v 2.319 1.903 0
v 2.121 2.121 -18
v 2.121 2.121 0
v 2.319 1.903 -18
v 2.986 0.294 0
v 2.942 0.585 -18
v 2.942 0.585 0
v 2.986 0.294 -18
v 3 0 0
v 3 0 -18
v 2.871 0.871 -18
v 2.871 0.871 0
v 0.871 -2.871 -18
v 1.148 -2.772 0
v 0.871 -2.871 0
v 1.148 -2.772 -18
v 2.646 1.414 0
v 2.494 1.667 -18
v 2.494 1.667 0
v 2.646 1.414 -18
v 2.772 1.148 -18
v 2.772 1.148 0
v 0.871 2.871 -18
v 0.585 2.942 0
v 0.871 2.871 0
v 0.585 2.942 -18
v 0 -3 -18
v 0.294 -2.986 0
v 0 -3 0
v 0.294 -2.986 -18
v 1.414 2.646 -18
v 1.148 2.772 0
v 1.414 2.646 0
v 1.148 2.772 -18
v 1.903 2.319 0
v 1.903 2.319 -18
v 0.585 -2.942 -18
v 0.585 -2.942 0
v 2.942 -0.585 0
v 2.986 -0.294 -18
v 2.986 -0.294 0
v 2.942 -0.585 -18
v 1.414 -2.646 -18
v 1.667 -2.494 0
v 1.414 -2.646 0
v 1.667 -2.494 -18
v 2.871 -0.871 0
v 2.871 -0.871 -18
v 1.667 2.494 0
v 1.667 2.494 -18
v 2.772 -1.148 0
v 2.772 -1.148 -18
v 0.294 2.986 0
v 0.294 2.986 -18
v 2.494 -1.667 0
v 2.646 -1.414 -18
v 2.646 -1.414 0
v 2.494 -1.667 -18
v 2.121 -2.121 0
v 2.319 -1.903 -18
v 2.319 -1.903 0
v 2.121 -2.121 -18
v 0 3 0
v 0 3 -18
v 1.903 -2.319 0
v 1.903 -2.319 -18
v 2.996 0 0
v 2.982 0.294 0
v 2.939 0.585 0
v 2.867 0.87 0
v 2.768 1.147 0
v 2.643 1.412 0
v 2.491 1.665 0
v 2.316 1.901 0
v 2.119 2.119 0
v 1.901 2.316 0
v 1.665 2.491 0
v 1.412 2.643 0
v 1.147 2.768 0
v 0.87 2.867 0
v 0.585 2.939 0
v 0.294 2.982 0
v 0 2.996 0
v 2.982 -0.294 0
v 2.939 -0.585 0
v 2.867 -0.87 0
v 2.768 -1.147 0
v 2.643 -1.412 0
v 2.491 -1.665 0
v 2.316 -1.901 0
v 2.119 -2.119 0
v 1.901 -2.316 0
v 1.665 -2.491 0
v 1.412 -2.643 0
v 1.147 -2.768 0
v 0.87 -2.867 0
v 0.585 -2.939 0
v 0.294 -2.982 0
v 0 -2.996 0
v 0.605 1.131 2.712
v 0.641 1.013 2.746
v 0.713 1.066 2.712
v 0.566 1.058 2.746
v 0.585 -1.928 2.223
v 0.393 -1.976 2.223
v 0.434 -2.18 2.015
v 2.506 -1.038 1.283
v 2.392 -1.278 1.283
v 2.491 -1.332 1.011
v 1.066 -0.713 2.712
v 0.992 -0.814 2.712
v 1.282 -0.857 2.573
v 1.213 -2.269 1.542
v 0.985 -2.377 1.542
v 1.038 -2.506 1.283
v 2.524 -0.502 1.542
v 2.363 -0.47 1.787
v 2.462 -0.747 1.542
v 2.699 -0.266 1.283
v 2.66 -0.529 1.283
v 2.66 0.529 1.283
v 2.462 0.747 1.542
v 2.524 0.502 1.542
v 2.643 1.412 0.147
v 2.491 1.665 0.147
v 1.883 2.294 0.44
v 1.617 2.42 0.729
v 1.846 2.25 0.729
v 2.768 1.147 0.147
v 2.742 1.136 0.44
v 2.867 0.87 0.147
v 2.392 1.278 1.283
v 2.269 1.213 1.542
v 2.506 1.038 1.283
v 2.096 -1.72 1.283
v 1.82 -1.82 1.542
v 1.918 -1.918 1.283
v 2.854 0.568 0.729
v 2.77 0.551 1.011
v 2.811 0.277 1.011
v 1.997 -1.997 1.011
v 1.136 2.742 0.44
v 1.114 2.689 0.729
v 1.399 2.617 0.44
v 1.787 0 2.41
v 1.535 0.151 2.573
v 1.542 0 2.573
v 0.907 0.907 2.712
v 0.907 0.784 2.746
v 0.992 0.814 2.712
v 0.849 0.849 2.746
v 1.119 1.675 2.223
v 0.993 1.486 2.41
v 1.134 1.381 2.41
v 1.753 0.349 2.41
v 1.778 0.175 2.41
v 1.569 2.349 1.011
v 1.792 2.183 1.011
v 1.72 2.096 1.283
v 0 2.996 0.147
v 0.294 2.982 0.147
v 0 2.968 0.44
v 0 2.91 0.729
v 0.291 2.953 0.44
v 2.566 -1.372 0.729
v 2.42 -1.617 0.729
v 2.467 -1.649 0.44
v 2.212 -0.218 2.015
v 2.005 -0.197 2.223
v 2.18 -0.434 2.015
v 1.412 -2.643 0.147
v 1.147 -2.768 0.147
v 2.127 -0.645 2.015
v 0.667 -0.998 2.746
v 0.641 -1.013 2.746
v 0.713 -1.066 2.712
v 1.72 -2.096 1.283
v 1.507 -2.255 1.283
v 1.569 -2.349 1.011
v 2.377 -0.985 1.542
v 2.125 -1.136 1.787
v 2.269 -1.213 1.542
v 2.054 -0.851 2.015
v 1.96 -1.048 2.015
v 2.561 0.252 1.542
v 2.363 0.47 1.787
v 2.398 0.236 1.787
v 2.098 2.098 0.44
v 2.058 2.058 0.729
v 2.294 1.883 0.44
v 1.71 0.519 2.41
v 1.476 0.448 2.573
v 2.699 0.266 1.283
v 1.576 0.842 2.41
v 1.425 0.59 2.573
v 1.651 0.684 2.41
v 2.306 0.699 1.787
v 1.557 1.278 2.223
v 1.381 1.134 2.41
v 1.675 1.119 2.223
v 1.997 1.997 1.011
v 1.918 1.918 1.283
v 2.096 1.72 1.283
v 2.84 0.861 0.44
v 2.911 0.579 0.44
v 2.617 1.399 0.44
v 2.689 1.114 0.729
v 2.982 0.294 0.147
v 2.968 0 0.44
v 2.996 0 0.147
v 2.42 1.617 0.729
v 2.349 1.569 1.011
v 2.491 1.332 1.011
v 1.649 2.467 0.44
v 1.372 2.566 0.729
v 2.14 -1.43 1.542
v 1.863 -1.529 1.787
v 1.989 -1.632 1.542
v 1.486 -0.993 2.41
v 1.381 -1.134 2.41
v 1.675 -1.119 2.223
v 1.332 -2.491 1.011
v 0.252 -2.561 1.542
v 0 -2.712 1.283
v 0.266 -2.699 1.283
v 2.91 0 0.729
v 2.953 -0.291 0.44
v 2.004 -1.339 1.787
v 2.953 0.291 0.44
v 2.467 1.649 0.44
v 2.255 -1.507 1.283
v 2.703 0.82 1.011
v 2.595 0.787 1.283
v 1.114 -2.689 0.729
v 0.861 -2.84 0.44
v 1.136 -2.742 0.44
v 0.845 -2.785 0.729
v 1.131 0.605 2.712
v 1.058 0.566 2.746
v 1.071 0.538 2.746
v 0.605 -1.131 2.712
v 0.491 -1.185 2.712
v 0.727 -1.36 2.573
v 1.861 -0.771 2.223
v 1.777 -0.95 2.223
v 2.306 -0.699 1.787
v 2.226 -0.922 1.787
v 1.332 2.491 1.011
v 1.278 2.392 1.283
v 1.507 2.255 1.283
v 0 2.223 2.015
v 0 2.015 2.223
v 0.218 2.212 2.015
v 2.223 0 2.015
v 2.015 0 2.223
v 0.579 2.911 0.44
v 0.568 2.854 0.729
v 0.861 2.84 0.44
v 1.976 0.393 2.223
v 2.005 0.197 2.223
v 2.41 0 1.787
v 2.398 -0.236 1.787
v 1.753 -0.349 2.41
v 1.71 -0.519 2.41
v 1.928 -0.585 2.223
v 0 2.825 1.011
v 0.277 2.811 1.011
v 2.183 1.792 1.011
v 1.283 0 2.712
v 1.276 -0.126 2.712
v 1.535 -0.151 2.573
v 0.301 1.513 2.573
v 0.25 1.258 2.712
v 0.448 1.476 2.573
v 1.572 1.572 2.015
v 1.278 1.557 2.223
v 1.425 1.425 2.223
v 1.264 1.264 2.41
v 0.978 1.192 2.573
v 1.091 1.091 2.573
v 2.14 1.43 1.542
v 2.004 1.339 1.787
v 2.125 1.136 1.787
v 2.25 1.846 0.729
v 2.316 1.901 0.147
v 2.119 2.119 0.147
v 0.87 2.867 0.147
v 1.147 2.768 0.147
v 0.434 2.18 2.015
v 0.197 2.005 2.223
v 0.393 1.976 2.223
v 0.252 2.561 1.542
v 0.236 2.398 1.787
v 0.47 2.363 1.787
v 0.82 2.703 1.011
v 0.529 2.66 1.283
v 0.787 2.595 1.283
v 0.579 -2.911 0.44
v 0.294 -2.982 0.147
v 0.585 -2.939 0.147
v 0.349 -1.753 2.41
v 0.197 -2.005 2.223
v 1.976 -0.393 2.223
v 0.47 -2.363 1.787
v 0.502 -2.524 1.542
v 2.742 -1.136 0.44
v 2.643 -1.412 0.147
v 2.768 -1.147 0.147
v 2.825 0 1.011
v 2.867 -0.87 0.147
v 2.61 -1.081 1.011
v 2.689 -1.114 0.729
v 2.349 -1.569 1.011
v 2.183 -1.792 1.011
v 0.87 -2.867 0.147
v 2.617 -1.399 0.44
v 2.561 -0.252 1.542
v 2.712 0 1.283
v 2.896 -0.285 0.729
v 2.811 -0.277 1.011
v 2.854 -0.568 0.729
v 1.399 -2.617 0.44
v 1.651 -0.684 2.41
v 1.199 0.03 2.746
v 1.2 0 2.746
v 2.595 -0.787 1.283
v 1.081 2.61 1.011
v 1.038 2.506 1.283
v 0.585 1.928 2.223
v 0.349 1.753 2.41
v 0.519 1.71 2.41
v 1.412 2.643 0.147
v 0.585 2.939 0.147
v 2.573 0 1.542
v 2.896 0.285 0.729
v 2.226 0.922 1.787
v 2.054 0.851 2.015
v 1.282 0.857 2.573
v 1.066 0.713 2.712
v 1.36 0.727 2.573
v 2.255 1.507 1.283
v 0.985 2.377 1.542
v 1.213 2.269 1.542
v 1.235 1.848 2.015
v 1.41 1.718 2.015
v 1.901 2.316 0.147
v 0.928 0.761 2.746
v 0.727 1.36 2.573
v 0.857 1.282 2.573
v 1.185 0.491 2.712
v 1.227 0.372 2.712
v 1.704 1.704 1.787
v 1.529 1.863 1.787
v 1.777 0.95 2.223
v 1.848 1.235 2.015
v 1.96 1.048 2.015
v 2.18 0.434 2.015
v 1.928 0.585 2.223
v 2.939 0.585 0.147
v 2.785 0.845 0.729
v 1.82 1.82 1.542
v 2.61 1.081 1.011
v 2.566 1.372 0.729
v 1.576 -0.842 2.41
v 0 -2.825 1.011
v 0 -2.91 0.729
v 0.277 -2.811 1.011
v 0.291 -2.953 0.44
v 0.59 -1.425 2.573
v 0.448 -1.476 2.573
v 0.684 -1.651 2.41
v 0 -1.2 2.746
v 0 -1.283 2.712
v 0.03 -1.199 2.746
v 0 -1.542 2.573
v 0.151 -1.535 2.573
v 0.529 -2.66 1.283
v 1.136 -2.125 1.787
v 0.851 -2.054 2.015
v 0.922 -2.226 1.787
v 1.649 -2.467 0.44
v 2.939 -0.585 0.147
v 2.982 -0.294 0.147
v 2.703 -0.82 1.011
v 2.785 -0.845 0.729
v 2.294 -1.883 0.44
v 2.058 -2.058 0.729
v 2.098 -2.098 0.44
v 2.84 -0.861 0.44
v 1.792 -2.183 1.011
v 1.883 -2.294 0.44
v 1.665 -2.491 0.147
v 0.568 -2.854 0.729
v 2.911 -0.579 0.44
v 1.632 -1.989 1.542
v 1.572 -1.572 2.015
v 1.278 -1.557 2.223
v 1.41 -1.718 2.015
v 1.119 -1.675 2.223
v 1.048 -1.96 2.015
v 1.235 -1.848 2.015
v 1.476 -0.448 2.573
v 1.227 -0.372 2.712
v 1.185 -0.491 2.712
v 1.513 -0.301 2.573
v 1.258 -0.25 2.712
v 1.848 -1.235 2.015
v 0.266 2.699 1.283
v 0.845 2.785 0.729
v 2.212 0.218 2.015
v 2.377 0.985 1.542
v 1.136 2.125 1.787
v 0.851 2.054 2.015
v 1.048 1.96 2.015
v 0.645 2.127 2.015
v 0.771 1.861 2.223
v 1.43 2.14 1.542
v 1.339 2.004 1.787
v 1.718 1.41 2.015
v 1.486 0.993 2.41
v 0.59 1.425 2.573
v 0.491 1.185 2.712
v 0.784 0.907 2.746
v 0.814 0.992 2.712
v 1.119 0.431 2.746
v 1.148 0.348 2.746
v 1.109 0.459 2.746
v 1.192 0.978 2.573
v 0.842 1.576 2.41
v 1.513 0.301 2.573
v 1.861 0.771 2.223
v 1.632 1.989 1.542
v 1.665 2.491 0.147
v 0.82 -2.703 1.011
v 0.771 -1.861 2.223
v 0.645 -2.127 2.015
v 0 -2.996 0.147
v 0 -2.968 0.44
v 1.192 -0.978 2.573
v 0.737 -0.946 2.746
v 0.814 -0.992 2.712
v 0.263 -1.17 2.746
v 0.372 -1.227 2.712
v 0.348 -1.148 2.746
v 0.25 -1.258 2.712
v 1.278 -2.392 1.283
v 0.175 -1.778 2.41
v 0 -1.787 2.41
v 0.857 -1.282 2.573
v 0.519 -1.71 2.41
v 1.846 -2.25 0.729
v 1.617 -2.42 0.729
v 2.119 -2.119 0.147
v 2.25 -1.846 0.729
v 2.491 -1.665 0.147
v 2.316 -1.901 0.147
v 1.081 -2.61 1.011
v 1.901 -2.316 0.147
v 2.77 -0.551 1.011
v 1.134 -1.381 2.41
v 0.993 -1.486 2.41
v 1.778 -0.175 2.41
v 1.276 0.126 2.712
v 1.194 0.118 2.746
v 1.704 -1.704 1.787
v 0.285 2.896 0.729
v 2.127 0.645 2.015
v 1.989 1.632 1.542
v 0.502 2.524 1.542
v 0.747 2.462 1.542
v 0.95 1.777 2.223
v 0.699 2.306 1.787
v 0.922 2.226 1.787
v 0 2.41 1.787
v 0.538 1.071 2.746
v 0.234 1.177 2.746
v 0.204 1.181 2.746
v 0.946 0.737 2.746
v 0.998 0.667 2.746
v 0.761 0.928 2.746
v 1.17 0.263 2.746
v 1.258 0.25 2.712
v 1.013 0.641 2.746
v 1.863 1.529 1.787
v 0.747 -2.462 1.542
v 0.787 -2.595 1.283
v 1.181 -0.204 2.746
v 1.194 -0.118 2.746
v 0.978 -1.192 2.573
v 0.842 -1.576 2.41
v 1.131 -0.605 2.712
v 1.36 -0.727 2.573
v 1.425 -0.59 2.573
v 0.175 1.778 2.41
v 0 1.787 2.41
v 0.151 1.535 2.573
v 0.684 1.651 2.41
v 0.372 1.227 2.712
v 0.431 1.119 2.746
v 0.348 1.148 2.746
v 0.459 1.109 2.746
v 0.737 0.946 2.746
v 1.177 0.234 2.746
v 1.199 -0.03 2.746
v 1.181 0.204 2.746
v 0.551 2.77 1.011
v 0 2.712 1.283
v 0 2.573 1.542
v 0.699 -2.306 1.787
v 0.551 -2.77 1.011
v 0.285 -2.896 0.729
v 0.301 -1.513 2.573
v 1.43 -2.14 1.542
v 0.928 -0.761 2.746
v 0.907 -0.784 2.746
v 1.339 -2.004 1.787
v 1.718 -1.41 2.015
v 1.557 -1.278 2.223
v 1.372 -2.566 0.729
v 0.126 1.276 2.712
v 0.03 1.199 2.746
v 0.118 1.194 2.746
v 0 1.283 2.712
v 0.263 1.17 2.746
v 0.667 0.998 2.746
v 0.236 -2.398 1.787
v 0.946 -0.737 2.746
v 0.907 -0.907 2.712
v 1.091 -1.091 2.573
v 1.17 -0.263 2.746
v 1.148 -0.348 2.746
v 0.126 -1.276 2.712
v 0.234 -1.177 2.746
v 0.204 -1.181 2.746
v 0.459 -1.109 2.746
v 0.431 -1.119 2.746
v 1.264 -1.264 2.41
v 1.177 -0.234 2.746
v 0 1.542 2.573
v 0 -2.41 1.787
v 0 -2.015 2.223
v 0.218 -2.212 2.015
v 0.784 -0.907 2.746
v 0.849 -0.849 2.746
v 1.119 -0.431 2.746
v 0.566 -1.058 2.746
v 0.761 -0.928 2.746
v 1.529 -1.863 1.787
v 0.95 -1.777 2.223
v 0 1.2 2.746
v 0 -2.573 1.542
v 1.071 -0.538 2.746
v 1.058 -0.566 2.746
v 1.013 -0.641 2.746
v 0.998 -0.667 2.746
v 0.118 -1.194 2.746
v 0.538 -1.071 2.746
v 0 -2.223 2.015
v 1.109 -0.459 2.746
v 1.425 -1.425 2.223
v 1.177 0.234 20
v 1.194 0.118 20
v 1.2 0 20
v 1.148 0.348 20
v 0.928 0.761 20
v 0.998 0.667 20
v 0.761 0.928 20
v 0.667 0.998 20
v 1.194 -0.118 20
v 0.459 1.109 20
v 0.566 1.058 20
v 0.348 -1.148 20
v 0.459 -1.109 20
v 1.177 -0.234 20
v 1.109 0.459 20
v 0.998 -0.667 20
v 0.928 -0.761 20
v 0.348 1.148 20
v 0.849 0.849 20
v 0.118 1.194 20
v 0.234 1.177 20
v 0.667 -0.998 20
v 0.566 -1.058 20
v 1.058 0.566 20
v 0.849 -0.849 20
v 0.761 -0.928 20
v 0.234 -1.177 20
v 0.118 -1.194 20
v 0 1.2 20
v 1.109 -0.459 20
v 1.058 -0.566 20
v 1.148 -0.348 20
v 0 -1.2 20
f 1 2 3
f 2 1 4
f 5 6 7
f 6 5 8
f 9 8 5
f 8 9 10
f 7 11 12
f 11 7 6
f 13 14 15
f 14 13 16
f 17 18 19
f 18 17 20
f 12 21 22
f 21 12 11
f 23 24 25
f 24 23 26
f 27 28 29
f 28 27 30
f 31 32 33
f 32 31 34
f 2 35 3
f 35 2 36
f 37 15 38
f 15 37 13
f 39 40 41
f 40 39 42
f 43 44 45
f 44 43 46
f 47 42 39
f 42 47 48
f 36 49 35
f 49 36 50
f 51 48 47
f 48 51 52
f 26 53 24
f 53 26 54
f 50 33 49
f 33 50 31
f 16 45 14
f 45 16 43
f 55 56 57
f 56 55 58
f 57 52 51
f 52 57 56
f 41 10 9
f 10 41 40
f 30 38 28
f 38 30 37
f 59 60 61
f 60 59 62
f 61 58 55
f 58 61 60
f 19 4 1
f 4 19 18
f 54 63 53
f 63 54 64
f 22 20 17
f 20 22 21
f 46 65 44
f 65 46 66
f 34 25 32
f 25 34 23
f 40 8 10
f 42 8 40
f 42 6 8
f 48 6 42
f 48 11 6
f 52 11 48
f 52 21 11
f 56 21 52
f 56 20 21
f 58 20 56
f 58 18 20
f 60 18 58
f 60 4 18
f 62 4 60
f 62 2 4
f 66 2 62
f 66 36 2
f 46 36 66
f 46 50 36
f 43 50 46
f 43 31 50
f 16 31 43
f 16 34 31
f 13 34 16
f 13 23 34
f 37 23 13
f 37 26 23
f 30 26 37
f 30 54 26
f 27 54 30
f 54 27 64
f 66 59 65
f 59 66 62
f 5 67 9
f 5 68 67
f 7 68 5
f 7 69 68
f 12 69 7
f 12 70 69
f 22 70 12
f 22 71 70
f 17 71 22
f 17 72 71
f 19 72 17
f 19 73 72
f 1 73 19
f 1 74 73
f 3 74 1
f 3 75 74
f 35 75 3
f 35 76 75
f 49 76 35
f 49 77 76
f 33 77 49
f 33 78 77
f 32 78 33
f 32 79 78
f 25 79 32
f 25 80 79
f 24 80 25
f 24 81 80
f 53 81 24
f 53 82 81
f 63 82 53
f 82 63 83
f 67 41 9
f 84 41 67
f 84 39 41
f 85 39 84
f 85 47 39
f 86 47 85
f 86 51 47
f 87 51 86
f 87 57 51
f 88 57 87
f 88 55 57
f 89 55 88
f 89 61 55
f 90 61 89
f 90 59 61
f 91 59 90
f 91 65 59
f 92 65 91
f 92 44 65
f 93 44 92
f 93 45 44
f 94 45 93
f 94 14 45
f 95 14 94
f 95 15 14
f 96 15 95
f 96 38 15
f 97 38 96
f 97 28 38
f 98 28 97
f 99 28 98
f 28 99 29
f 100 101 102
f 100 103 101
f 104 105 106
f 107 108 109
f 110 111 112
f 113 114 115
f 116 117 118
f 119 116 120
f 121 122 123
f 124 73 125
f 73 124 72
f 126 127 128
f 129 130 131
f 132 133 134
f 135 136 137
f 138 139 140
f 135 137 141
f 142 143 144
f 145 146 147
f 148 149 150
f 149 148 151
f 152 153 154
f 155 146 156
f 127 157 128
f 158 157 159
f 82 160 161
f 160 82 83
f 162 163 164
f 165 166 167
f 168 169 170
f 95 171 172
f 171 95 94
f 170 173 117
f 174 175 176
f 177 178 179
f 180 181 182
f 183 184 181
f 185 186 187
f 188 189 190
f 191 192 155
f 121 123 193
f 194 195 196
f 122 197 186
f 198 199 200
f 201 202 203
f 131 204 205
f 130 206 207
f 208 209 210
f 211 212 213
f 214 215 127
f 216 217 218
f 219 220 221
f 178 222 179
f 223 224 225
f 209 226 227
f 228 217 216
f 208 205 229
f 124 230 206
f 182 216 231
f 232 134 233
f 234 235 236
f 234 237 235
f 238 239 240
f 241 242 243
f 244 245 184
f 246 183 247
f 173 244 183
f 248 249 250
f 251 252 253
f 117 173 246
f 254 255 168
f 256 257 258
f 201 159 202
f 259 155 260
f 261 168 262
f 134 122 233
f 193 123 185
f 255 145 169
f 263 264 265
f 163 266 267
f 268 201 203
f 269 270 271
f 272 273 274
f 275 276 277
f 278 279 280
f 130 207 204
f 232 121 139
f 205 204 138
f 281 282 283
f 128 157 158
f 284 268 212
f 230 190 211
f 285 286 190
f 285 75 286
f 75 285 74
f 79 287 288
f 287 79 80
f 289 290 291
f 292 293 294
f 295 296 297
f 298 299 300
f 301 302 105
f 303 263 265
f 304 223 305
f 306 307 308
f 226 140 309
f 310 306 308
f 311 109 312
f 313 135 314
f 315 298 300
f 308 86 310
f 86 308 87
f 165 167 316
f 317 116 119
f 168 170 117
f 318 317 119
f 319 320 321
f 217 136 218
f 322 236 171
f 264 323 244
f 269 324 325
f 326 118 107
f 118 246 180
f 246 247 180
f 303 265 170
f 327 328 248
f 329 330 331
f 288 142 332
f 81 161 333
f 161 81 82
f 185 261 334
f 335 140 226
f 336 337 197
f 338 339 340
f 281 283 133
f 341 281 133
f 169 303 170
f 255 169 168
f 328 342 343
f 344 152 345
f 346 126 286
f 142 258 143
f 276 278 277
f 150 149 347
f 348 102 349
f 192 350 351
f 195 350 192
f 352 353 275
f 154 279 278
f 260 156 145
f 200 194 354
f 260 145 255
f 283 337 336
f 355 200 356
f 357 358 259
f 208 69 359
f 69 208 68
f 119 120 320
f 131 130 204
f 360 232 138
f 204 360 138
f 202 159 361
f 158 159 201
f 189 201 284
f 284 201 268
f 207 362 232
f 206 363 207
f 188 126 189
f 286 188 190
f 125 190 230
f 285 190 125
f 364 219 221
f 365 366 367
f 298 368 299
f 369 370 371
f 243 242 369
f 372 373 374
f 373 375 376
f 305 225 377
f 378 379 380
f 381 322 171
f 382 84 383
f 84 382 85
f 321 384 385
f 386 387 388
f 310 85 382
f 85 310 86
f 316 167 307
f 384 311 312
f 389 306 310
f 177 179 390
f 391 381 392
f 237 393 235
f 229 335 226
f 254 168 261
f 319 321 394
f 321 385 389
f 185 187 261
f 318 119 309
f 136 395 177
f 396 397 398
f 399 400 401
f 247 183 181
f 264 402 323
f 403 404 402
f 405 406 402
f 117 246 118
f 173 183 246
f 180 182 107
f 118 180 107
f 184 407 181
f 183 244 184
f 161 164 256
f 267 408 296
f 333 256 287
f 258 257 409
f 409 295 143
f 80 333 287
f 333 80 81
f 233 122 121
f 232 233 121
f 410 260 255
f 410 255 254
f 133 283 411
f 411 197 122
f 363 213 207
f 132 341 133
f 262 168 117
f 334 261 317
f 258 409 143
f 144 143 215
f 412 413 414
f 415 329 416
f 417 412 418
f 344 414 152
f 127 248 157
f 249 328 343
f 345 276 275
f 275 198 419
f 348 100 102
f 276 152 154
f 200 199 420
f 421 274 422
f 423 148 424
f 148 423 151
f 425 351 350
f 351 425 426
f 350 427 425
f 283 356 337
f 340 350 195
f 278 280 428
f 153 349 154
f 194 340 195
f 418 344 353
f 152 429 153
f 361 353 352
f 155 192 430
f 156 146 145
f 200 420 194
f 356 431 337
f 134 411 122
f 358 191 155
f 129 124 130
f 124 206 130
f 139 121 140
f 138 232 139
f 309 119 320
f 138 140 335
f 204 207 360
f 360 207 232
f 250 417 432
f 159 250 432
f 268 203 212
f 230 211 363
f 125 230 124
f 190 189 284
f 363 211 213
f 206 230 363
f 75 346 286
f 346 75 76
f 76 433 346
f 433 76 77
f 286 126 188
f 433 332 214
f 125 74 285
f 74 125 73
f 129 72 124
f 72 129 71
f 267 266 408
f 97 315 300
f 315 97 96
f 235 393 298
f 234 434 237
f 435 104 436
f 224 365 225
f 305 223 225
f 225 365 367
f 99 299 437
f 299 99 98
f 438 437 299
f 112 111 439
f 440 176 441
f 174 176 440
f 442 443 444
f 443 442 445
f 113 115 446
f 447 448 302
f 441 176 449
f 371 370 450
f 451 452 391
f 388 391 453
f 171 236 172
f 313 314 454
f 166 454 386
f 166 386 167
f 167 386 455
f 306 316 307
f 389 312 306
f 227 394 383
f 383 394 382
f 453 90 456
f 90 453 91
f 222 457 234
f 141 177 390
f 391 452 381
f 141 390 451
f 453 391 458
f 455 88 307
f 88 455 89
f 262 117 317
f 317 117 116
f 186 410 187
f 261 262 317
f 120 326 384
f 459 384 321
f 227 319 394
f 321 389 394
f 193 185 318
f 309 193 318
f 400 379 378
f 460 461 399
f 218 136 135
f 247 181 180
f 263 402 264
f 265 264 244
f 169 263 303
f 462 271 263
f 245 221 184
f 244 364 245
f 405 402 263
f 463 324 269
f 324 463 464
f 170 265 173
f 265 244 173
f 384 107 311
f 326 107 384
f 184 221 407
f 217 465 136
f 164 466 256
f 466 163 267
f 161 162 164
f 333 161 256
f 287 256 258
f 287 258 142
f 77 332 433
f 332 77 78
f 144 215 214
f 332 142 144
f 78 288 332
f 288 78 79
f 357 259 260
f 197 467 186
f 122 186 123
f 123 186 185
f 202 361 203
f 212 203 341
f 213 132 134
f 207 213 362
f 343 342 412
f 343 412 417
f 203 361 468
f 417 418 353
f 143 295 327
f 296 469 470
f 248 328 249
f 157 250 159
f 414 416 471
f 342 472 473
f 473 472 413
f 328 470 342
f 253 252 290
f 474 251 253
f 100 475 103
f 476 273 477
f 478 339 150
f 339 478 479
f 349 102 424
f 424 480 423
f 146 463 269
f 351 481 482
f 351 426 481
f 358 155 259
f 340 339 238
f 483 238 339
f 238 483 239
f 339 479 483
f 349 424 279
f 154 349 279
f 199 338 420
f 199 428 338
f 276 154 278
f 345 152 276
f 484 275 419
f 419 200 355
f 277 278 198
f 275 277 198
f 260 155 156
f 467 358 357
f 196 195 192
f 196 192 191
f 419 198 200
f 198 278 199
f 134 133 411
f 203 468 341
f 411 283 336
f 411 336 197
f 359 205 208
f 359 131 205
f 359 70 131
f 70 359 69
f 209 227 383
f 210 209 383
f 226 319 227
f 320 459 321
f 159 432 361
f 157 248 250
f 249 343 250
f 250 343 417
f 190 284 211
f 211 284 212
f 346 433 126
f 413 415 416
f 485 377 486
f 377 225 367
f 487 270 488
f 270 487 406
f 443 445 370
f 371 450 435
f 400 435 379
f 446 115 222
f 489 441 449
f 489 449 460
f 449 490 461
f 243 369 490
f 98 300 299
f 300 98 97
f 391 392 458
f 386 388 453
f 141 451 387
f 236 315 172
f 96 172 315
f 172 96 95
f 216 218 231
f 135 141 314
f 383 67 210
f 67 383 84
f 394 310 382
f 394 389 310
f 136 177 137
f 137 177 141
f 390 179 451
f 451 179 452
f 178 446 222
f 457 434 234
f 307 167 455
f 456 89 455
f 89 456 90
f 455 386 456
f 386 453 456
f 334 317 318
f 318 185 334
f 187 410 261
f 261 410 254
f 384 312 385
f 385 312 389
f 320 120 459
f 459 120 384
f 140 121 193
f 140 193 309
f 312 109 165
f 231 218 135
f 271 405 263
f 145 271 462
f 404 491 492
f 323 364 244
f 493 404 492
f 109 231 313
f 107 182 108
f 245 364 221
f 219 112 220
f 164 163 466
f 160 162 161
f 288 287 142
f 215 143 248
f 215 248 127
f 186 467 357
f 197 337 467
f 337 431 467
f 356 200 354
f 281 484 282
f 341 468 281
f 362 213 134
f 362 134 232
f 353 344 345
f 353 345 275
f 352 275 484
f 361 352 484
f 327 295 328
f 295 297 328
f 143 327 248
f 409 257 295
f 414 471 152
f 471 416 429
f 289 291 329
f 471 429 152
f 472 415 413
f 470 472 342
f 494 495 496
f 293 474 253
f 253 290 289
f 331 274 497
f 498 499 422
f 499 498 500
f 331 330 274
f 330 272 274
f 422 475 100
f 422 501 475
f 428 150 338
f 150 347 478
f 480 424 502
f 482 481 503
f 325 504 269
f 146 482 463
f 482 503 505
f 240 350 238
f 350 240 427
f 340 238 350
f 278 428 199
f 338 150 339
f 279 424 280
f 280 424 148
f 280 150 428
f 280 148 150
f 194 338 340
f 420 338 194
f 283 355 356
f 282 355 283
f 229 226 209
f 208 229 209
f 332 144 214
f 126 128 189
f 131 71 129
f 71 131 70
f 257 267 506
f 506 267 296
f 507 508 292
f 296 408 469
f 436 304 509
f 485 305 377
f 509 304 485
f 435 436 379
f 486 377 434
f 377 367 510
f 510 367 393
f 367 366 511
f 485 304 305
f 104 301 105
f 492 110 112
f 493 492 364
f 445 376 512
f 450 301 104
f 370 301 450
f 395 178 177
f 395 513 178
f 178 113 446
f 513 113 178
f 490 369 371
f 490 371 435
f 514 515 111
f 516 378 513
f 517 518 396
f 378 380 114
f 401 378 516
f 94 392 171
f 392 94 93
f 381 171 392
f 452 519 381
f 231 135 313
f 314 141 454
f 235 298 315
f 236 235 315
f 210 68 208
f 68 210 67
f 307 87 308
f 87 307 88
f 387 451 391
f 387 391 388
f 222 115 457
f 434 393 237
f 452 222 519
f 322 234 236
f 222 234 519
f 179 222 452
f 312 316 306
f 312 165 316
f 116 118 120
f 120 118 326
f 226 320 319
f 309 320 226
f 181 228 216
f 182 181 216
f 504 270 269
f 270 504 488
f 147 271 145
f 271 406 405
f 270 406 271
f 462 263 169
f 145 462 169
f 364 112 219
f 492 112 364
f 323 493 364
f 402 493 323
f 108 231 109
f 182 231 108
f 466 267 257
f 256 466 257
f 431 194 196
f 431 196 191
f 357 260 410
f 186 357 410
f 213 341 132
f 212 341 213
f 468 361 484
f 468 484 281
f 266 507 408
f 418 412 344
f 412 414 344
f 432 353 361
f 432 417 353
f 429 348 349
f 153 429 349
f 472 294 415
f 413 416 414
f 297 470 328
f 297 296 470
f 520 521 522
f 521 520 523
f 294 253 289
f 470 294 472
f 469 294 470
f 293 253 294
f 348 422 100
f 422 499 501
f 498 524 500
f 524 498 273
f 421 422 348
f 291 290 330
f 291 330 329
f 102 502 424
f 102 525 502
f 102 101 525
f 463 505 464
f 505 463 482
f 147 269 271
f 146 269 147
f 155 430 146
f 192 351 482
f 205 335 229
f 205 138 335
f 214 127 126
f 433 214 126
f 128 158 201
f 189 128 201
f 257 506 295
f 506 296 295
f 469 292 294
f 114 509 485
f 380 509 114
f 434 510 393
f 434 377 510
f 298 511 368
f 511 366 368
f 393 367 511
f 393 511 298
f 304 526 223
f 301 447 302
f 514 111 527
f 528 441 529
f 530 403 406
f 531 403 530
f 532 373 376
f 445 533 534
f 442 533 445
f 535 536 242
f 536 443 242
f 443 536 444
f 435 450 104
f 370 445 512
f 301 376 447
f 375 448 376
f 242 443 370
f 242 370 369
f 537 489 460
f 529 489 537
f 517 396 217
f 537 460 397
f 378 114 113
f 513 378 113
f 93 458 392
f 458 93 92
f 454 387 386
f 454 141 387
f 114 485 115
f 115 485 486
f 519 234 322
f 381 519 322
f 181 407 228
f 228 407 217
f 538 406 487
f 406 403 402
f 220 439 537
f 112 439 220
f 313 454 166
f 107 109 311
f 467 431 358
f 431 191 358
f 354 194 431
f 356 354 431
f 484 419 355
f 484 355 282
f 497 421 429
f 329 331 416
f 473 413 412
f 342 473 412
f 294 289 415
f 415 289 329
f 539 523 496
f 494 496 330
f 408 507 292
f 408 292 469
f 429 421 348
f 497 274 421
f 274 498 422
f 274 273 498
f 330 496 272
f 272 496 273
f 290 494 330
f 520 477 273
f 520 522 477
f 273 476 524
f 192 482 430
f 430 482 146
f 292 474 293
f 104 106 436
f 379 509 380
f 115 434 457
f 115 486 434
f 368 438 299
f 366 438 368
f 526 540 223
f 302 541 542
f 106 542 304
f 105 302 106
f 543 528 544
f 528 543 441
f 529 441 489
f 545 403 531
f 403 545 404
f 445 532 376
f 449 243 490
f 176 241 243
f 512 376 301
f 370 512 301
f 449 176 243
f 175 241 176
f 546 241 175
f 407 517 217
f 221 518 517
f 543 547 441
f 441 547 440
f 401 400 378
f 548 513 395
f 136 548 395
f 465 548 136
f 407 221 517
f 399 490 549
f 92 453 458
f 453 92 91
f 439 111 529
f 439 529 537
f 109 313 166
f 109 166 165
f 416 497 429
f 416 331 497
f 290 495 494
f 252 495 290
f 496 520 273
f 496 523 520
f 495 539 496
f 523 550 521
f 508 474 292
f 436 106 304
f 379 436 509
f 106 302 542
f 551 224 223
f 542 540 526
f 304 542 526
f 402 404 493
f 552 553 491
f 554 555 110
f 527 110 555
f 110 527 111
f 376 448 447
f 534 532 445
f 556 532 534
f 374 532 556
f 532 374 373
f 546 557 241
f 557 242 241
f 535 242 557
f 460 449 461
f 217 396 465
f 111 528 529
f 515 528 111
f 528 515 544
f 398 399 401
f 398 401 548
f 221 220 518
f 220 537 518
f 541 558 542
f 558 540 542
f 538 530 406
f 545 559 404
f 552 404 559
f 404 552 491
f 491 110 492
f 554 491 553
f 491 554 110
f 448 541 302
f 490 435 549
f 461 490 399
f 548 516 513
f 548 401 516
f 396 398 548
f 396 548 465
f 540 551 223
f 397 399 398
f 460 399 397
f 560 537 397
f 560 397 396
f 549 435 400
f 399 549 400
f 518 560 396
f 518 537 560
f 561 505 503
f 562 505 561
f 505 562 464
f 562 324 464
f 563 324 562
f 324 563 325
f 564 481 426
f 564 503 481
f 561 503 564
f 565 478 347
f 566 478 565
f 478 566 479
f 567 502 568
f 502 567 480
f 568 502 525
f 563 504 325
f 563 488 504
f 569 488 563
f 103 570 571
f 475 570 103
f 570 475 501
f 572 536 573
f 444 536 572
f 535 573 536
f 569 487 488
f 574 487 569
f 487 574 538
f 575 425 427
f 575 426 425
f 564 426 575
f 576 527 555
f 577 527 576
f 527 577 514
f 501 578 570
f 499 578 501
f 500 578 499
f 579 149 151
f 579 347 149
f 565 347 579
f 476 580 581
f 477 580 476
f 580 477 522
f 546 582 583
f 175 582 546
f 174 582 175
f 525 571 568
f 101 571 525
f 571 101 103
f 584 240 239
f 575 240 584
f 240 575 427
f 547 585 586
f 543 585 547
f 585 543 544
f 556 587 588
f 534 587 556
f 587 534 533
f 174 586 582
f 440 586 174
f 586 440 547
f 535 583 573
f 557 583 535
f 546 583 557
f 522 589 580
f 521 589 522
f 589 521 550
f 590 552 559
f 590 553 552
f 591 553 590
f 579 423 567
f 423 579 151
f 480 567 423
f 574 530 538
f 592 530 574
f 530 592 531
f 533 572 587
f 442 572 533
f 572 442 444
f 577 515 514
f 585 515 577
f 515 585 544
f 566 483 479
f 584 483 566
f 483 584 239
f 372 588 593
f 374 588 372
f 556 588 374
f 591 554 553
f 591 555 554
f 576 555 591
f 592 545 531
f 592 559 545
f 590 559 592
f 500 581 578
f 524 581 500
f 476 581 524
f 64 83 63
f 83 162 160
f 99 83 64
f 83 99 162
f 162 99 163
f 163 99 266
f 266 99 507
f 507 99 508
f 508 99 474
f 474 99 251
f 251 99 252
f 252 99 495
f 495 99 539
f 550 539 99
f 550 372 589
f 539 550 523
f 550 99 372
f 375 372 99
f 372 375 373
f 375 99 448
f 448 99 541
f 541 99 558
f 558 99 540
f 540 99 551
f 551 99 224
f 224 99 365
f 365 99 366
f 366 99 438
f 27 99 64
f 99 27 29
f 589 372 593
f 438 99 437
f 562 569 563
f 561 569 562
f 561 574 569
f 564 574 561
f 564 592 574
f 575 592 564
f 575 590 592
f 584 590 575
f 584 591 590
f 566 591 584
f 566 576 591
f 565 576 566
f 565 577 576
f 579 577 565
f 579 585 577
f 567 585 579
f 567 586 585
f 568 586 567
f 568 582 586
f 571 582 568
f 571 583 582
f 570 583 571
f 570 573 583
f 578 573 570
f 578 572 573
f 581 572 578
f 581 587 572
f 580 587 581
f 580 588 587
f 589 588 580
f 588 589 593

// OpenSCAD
// file: E_tpu_rebar.scad
// =============================================================================
// Design E — TPU "rebar" (barbed) embedded several mm into the PETG strut tip
// =============================================================================
// TPU cable extends several mm into the PETG strut tip; PETG is printed on
// top of and around the embedded TPU, mechanical pullout limited by barbs
// (rebar in concrete). Per Edison ANALYSIS c38a2046 §4 geometry:
//   - Embed length:        10–12 mm along the strut axis (here: 11 mm)
//   - Anchor stem Ø:       2.4 mm (matches cable_d)
//   - Barbs:               2–3 at 2.0 mm pitch
//   - Barb major Ø:        3.0–3.2 mm (here: 3.1 mm)
//   - Barb step height:    ≥ 0.4 mm
//   - Flank angles:        30–45° on pull-out face; 45–60° on insertion face
//   - PETG ligament:       ≥ 1.0–1.2 mm from barb crest to outer surface
// =============================================================================
include <_common.scad>

embed_l       = 11.0;     // axial embed depth along strut axis (-Z direction from tip)
n_barbs       = 3;
barb_pitch    = 2.0;
barb_major_d  = 3.1;
barb_step     = (barb_major_d - cable_d) / 2;     // 0.35 mm radial step (close to spec)
flank_pull    = 35;       // pull-out face flank from radial (deg). Smaller = sharper barb.
flank_push    = 55;       // insertion face flank (deg). Larger = easier to insert.

// One barb as a triangular cross-section ring around the stem, centered
// on axial position z_center. Sharp pull-out face on the +Z side (toward
// the strut tip — bears load when the cable is pulled), shallow insertion
// face on the -Z side.
module one_barb(z_center) {
    pull_run = barb_step / tan(flank_pull);   // axial run of the sharp face
    push_run = barb_step / tan(flank_push);   // axial run of the shallow face
    translate([0, 0, z_center])
        rotate_extrude($fn=64)
            polygon(points = [
                [cable_d/2,        pull_run],   // stem just above crest (sharp side)
                [barb_major_d/2,   0],          // crest at radius barb_major_d/2
                [cable_d/2,       -push_run],   // stem well below crest (shallow side)
            ]);
}

module rebar_anchor() {
    // The embedded TPU rebar lives in the strut tip below z = 0.
    union() {
        // Stem
        translate([0, 0, -embed_l]) cylinder(h=embed_l, d=cable_d);
        // Barbs at evenly-spaced axial positions (deepest first)
        for (i = [0:n_barbs-1])
            one_barb(z_center = -embed_l + barb_pitch + i*barb_pitch);
    }
}

module designE_petg() {
    difference() {
        union() {
            translate([0, 0, -strut_l]) cylinder(h=strut_l, d=strut_d);
            sphere(d=strut_d);
        }
        rebar_anchor();
    }
}

module designE_tpu() {
    rebar_anchor();
    // Cable continues out the strut tip toward +Z (the natural strut axis)
    cylinder(h=cable_l, d=cable_d);
}

module designE() {
    petg() designE_petg();
    tpu()  designE_tpu();
}

designE();
// file: _common.scad
// Shared parameters for the five candidate PETG-strut + TPU-cable joint
// designs explored in `edison-trajectories/joint-design/`.
//
// Coordinate convention (per design): the PETG strut runs along +Z and the
// TPU cable runs along the global +X direction (so the joint plane is the
// X-Z plane). All units in mm. PETG is rendered orange, TPU dark cyan.
strut_d = 6.0;     // PETG strut diameter (matches t3-prism.scad)
cable_d = 2.4;     // TPU cable diameter (matches t3-prism.scad)
strut_l = 18.0;    // visible strut length to render
cable_l = 30.0;    // visible cable length on each side
$fn = 64;

PETG_RGB = [0.95, 0.55, 0.20];
TPU_RGB  = [0.10, 0.55, 0.55];

module petg() { color(PETG_RGB) children(); }
module tpu()  { color(TPU_RGB)  children(); }

// Strut as a vertical capsule along +Z, tip at z = 0, body extending to -strut_l.
module strut_body(length = strut_l, d = strut_d) {
    translate([0, 0, -length]) cylinder(h=length, d=d);
    sphere(d=d);
}

// Straight TPU cable along +X.
module cable_segment(length = cable_l, d = cable_d, x0 = 0) {
    translate([x0, 0, 0])
        rotate([0, 90, 0])
            cylinder(h=length, d=d);
}
// main file
// Section view of Design E — cut at the X=0 plane, keep +X half (cut at X=0).
// Apply intersection per-color part so PETG/TPU colors survive the CSG.
include <_common.scad>
use <E_tpu_rebar.scad>

module half_cube_X() { translate([0, -30, -40]) cube([60, 60, 60]); }

petg() intersection() { designE_petg(); half_cube_X(); }
tpu()  intersection() { designE_tpu();  half_cube_X(); }
